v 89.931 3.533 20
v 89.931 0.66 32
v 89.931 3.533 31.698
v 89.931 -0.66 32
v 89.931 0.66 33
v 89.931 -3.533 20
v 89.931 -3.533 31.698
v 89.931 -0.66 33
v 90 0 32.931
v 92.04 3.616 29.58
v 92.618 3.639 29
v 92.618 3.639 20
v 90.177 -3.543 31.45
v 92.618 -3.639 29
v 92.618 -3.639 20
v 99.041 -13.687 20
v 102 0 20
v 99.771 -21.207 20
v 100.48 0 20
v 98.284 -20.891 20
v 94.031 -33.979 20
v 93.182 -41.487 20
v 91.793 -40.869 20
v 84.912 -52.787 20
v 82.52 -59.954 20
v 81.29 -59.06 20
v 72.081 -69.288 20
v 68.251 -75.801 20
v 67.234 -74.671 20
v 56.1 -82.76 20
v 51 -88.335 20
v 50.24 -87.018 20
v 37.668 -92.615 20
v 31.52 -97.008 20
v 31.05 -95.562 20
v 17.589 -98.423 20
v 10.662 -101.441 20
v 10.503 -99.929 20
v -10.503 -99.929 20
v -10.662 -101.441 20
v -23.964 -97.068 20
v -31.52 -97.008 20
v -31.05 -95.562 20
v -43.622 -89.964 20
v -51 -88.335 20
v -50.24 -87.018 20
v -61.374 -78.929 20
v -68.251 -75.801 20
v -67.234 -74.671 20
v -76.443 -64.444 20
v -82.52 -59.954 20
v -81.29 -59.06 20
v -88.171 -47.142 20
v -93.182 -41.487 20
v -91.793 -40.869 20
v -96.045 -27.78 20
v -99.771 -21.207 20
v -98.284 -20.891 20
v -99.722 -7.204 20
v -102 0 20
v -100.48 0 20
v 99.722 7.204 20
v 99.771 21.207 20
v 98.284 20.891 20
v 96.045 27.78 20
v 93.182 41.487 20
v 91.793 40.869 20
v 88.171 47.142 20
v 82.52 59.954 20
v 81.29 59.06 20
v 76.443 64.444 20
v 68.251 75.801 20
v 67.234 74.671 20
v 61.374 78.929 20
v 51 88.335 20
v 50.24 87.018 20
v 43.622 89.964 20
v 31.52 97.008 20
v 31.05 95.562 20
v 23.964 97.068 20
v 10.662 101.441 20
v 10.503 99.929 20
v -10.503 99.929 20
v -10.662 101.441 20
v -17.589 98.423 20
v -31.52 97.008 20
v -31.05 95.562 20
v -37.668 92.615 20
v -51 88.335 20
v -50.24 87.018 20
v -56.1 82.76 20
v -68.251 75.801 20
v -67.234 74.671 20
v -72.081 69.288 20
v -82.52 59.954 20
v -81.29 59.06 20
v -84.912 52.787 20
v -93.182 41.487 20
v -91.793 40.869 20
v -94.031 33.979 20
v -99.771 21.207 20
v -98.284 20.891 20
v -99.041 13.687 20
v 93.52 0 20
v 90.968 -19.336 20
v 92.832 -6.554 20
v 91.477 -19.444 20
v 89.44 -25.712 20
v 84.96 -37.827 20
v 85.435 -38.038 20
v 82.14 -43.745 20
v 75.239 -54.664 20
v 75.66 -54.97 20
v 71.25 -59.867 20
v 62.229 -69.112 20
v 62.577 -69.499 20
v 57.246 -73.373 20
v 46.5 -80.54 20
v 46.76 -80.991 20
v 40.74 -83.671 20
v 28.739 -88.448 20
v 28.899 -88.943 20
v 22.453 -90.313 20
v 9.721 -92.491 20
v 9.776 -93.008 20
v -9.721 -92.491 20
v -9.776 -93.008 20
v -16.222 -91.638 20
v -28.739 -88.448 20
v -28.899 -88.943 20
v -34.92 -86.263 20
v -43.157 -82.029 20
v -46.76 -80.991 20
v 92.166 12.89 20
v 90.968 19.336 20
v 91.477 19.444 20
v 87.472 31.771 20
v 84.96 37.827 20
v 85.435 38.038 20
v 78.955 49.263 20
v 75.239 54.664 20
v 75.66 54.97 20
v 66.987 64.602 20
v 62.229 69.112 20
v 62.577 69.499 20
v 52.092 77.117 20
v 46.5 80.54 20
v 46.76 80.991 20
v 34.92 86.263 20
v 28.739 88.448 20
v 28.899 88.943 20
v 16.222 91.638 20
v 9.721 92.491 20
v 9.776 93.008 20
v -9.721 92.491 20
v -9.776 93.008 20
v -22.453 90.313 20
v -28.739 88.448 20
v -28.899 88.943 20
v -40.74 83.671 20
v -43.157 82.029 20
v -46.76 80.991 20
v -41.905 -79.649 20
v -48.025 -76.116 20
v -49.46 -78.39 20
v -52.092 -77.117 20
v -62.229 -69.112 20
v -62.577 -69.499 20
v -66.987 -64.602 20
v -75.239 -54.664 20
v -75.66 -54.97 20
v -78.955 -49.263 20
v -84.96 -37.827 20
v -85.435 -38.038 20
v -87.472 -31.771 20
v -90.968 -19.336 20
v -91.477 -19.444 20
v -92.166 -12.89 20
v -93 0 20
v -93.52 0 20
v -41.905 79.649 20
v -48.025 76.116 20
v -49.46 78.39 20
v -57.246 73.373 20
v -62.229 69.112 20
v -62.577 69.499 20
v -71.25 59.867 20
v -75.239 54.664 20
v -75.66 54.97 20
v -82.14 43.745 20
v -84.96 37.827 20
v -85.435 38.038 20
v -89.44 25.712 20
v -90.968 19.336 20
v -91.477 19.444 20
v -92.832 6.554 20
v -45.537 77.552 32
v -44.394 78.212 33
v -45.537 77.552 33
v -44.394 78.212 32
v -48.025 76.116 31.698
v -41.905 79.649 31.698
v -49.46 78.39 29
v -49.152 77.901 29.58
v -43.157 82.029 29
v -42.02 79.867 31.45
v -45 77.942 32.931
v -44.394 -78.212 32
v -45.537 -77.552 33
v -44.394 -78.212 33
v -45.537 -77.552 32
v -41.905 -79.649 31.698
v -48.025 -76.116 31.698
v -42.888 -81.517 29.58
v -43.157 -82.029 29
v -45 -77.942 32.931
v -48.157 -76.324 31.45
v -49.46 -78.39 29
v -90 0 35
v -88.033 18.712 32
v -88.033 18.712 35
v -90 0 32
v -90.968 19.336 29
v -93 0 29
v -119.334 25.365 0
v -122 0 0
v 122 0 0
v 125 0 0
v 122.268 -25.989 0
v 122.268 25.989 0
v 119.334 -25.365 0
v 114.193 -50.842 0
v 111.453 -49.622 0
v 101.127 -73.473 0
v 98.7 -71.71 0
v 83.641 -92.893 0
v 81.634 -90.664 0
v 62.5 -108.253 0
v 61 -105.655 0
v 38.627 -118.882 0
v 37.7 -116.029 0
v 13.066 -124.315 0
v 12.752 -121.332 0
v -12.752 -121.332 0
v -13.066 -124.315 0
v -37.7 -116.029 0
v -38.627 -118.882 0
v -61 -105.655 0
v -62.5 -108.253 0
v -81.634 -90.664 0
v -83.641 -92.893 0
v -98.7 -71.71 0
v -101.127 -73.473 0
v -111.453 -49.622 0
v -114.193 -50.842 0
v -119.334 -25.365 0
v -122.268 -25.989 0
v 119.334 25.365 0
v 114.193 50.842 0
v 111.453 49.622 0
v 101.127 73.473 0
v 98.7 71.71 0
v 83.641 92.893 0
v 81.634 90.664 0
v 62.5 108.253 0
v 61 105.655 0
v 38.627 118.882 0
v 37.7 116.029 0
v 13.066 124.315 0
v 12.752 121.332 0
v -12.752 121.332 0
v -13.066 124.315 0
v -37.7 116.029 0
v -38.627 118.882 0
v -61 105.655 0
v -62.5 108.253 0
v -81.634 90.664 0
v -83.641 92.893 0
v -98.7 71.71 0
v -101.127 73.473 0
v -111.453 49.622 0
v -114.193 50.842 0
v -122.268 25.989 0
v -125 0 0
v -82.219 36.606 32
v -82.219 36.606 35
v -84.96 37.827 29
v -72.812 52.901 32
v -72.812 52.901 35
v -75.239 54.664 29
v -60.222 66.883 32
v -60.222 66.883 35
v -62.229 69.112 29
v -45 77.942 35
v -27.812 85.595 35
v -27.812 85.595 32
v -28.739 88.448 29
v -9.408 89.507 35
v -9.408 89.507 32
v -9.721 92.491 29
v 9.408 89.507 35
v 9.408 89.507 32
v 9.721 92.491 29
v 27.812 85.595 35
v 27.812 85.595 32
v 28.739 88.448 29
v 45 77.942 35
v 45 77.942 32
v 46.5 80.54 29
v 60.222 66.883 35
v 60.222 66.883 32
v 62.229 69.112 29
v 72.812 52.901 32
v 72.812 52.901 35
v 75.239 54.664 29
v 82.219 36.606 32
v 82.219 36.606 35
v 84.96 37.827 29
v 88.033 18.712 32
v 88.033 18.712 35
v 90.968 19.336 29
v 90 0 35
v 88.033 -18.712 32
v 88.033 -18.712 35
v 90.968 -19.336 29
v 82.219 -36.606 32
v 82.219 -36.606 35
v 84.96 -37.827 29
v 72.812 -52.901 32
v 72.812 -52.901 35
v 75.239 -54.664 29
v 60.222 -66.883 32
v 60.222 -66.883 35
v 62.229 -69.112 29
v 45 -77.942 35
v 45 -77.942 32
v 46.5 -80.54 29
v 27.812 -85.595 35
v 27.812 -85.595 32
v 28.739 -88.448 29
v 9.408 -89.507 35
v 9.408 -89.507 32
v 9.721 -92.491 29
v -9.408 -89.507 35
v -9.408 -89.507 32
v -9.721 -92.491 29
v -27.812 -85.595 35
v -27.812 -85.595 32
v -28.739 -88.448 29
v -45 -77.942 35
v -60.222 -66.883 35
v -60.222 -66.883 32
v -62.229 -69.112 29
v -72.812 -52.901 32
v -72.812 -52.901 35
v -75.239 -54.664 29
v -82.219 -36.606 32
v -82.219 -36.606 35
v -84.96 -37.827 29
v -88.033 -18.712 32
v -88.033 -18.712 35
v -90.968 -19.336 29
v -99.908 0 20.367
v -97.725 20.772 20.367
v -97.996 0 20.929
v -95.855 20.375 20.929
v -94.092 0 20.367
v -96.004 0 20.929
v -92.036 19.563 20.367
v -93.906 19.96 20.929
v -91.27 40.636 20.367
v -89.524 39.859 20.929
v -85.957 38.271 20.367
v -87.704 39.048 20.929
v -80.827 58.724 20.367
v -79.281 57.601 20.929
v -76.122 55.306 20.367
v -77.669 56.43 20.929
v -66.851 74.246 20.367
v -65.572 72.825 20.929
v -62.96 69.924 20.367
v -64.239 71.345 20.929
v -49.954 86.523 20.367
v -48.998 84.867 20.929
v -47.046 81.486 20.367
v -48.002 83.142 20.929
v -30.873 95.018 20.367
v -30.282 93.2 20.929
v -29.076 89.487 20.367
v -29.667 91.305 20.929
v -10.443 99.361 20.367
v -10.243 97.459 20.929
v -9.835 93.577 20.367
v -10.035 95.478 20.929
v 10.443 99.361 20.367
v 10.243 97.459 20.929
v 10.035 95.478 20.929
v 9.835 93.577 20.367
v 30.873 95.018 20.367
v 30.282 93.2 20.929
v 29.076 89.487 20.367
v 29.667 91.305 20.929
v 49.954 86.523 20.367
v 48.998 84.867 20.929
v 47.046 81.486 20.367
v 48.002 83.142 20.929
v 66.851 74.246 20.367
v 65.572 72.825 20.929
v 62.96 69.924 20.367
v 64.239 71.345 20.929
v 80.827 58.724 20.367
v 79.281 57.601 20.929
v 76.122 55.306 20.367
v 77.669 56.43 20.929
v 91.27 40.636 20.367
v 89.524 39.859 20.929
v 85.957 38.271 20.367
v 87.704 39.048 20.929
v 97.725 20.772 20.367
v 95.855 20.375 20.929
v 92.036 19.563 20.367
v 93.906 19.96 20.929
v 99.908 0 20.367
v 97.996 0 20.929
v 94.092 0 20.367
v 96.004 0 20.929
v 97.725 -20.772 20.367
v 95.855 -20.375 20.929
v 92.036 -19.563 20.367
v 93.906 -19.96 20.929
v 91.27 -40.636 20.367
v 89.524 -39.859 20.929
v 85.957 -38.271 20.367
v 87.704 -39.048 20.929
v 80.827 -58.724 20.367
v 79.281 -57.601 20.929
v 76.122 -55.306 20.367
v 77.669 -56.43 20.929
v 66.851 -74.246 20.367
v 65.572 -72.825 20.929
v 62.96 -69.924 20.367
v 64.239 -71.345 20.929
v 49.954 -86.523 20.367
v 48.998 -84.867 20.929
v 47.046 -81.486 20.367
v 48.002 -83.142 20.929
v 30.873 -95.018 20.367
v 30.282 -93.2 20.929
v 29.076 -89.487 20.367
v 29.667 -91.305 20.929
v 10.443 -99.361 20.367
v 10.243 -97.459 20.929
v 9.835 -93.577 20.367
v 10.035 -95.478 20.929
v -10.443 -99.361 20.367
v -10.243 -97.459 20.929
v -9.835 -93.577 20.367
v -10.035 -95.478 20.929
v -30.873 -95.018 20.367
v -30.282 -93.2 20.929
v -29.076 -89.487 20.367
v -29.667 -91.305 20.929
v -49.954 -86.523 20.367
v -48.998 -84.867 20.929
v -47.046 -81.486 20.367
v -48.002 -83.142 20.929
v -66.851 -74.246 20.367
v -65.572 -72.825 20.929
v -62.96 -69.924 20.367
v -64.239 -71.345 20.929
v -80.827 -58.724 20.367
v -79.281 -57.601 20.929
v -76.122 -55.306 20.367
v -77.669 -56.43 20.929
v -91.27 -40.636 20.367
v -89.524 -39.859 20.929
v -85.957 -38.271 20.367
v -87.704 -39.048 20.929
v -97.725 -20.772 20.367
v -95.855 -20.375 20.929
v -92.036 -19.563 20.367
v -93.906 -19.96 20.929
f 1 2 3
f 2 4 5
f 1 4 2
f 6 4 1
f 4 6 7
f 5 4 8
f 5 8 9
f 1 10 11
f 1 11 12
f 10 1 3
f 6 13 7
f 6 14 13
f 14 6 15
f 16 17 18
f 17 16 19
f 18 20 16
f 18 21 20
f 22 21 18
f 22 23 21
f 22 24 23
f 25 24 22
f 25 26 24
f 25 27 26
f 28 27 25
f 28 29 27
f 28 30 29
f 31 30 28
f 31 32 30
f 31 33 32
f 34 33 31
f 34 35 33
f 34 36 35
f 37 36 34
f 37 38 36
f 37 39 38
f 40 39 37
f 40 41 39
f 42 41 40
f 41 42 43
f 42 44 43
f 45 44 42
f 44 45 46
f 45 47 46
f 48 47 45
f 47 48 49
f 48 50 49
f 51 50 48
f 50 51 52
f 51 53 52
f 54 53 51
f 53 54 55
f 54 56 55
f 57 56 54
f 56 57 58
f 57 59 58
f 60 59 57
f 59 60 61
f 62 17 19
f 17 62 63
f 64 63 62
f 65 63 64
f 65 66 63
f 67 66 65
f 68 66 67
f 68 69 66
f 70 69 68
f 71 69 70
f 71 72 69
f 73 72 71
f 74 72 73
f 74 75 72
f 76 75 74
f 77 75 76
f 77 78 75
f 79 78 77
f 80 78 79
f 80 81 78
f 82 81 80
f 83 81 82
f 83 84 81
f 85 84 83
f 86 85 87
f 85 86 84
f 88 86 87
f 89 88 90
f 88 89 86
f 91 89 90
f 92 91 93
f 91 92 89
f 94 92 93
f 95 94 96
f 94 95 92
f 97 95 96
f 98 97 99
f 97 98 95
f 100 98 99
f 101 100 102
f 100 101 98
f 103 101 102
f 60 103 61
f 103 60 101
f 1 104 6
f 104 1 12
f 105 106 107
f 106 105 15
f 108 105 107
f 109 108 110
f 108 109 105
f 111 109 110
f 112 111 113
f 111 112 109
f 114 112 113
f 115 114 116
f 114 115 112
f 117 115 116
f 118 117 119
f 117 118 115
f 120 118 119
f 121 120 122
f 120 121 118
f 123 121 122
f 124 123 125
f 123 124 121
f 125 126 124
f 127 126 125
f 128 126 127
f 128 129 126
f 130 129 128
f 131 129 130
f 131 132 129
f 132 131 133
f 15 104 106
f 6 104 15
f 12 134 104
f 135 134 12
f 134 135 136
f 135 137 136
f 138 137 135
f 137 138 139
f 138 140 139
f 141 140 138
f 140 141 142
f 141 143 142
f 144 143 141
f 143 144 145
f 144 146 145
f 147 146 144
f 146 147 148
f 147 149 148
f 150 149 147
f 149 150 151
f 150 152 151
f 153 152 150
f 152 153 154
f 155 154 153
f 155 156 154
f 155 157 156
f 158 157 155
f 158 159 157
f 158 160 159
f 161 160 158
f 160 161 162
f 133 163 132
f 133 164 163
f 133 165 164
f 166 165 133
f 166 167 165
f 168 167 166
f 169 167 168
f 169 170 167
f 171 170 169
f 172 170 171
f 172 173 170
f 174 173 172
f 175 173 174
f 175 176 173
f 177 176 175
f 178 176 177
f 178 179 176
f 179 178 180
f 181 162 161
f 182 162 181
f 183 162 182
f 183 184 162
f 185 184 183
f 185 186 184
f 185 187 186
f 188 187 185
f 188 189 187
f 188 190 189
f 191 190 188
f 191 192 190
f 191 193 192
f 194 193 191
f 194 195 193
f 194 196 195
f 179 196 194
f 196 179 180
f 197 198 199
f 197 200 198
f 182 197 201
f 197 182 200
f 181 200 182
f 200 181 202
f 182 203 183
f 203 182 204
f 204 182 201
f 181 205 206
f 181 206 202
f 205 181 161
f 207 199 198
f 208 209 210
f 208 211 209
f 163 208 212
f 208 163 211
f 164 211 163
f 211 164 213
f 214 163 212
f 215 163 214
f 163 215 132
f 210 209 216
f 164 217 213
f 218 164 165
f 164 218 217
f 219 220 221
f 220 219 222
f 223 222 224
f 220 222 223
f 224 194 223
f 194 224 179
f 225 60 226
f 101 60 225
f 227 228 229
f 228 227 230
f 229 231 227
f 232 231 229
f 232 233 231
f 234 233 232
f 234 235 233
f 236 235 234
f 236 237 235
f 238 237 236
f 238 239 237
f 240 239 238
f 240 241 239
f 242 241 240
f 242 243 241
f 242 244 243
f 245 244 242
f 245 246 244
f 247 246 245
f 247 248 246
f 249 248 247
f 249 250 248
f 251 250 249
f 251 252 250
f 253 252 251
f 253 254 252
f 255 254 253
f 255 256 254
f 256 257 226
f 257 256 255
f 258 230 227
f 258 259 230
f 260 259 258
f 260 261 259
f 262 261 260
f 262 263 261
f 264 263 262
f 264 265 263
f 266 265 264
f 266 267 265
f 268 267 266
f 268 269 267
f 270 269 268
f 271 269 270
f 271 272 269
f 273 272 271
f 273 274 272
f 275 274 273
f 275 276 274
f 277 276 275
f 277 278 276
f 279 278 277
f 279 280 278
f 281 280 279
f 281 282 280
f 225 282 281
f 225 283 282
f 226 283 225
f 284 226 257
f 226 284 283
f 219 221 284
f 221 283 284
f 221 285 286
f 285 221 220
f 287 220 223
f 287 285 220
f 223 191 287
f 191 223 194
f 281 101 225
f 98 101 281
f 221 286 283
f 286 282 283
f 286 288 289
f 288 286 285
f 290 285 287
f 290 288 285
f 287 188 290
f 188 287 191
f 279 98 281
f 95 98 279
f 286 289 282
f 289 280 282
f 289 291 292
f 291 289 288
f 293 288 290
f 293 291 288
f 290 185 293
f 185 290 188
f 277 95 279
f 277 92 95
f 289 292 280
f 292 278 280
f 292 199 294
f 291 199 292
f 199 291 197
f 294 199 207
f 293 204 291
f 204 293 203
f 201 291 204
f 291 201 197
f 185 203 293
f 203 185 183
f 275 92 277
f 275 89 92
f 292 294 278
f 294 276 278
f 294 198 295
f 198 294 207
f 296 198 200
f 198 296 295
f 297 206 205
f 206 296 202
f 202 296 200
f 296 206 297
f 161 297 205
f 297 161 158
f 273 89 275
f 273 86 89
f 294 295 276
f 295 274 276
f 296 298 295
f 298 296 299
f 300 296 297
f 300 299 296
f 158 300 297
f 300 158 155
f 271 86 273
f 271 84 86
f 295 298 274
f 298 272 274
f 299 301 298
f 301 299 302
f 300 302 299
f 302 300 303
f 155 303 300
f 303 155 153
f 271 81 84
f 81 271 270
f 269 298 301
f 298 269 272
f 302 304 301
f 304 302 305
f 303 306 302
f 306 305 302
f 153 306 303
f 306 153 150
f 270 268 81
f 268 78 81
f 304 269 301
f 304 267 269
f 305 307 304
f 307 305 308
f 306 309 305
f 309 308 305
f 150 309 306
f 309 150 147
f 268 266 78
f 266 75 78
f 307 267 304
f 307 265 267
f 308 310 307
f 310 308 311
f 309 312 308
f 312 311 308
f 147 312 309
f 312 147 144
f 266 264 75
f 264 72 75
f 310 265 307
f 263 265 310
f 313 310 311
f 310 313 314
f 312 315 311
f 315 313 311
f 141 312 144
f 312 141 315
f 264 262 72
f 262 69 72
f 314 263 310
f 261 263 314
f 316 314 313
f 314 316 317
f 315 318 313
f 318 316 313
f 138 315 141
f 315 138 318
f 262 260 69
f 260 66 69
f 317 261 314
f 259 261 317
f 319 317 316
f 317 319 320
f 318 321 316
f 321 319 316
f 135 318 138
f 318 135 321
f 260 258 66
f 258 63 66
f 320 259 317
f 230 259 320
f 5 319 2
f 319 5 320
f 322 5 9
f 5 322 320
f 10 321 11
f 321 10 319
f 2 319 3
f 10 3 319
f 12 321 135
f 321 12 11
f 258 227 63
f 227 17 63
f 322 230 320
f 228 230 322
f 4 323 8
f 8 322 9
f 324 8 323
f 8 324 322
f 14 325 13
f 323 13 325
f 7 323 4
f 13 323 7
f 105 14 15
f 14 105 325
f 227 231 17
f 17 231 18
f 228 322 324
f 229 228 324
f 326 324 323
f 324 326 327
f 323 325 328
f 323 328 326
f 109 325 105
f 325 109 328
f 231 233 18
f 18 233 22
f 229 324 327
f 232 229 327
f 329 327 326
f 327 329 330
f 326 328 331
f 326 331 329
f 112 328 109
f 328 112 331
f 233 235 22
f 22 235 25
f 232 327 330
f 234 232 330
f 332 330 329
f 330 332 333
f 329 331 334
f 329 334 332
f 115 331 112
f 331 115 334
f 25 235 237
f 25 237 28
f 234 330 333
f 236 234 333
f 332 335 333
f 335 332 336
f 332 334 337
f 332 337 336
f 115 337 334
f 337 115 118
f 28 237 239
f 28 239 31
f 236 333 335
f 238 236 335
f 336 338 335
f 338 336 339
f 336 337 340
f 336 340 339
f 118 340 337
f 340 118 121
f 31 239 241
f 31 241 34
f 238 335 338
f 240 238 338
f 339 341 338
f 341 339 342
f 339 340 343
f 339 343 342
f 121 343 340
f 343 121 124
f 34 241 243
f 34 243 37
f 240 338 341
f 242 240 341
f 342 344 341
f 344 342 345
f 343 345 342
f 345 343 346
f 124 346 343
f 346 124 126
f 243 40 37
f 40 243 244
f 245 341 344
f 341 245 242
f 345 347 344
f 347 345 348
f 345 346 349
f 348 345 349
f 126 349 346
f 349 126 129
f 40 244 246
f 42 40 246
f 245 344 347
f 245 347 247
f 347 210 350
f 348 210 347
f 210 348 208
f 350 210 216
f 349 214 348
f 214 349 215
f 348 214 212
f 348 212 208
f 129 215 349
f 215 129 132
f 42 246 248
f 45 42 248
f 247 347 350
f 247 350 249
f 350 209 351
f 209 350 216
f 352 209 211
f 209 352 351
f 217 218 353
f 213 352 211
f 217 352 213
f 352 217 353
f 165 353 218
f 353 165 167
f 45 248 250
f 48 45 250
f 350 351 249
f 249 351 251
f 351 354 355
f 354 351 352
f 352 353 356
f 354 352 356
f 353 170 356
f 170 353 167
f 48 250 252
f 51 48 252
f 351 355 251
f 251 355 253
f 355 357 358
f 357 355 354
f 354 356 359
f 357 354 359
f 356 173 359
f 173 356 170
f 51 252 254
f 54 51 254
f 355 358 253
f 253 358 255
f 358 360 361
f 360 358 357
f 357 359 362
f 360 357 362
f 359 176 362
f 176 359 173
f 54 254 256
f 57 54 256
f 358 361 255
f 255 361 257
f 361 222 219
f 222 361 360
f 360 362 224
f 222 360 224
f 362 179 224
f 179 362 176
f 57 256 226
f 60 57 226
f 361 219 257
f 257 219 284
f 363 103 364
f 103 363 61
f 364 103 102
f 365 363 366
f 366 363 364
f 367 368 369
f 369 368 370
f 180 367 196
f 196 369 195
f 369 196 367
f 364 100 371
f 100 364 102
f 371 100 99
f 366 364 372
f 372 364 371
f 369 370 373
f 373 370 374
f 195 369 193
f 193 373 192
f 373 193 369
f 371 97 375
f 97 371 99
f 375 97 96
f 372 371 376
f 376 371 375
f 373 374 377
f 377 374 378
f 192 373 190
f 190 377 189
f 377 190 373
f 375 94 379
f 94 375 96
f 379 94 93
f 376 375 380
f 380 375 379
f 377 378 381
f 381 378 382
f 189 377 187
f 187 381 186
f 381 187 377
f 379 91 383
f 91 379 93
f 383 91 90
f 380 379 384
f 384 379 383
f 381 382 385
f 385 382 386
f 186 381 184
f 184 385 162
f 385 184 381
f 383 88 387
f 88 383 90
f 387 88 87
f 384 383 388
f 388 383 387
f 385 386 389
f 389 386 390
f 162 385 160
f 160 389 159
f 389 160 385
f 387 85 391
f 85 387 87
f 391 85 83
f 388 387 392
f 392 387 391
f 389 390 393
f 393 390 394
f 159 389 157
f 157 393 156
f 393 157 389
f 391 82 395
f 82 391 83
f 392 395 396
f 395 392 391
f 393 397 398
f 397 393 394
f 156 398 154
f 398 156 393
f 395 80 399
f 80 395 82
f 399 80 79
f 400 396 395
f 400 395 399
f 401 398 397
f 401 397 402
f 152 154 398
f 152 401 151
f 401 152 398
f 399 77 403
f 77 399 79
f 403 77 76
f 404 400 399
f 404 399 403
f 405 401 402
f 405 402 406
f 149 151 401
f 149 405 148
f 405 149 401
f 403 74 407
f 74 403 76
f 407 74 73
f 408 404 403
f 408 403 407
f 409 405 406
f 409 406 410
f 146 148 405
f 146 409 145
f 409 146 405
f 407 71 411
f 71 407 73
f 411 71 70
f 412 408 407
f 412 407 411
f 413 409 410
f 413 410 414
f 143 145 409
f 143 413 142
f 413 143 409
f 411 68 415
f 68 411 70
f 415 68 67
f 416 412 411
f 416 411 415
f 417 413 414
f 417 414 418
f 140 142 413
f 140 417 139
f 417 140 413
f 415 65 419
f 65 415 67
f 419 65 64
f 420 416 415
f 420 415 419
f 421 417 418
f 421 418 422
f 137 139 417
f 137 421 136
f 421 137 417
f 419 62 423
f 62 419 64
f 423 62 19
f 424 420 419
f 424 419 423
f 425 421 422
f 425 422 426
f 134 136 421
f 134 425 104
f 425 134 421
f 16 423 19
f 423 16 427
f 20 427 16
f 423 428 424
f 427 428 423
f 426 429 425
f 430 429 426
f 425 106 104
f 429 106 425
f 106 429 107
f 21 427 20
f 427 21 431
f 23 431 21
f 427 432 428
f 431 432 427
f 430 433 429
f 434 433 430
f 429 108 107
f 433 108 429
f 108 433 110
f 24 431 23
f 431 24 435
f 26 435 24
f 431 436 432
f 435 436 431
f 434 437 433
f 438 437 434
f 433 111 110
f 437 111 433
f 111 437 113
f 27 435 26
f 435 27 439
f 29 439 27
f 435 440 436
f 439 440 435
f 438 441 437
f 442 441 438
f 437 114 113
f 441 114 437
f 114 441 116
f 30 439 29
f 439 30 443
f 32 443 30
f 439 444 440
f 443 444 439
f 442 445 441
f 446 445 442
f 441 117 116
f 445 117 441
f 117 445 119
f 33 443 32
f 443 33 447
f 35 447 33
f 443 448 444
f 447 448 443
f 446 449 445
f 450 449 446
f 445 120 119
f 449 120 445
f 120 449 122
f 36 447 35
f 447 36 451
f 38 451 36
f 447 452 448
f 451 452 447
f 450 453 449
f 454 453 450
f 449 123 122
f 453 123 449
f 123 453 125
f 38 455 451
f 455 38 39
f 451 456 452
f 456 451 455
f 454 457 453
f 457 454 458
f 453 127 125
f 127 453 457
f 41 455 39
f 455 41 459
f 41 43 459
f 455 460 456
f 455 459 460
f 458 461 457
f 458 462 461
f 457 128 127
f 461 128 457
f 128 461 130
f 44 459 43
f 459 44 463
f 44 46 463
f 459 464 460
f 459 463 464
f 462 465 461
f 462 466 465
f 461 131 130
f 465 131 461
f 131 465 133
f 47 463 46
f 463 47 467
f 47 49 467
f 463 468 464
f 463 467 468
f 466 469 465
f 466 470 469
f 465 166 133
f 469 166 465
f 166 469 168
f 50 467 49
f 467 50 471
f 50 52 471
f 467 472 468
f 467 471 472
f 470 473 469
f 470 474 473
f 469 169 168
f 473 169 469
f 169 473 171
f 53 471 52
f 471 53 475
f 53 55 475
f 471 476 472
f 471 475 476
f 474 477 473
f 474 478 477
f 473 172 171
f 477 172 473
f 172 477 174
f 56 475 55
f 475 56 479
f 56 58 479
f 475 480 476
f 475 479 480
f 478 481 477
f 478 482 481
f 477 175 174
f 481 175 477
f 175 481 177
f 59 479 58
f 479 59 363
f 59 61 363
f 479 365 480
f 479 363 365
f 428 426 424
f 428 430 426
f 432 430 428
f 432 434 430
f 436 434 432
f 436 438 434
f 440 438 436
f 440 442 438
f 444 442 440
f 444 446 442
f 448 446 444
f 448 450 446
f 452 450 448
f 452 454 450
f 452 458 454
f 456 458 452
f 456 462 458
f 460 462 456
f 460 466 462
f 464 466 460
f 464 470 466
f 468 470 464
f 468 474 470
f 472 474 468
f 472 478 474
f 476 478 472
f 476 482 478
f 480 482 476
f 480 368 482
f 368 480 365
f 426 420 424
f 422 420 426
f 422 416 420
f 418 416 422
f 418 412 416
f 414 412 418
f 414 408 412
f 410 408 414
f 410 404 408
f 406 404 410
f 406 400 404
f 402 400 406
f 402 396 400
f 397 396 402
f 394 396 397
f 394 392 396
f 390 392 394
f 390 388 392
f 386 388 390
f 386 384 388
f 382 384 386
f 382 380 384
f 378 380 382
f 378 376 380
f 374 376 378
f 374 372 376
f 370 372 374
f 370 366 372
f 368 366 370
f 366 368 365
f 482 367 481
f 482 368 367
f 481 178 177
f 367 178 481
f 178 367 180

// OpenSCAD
jogwheel_outer_rad = 125;
jogwheel_inner_rad = 90;
jogwheel_height = 35;
thickness = 3;

// vertical datum is at bottom of this part
// centred on z-axis

module jogwheel_outer(outer_params){
    
    outer_rad = outer_params[0];
    outer_inside_rad = outer_params[1];
    jogwheel_height = outer_params[2];
    thickness = outer_params[3];
    bearing_params = outer_params[4];
    tooth_params = outer_params[5];
    bearing_grooves = outer_params[6];
    clearances = outer_params[7];

    outer_bear_rad_offset = bearing_params[0];
    outer_bear_vert_offset = bearing_params[1];
    bearing_dims = bearing_params[4];
    bearing_OD = bearing_dims[1];

    tooth_depth = tooth_params[0];
    tooth_height = tooth_params[1];
    tooth_width = tooth_params[2];

    bearing_groove_dim = bearing_grooves[0];
    bearing_groove_depth = bearing_grooves[1];
    outer_bearing_groove_rad = bearing_grooves[3];

    clearance = clearances[0];

    // not used, here for ref for asm:
    // bearing_centre = jogwheel_inner_rad + 7.5; 
    bearing_rest_height = bearing_OD/2 + 8.5;
    mating_slot_width = tooth_width - 2*clearance; // this is an angle
    mating_slot_clearance = 1; // just used to give overlap for the union of slots

    //color("black")
    difference() {
        union() {
            
            // main shape, swept polygon
            // dimensions worked out for a 45 degree angle
            rotate_extrude()
            polygon( points=[[outer_inside_rad, jogwheel_height],
                [outer_rad, 0],
                [outer_rad-thickness, 0],
                [outer_rad - thickness - bearing_rest_height, bearing_rest_height],
                [outer_inside_rad + thickness, bearing_rest_height],
                [outer_inside_rad + thickness, jogwheel_height - 2*thickness],
                [outer_inside_rad, jogwheel_height - thickness]] );

            // mating slots to match jogwheel_inner
            mating_slot_start = outer_inside_rad + thickness + mating_slot_clearance;

            for ( i = [0 : 2] ) {
                rotate([0,0,i*120 - mating_slot_width/2])
                rotate_extrude(angle=mating_slot_width)
                polygon( points=[[outer_inside_rad, jogwheel_height - thickness + mating_slot_clearance],
                    [mating_slot_start, jogwheel_height - 2*thickness],
                    [mating_slot_start, bearing_rest_height],
                    [outer_inside_rad, bearing_rest_height]] );
            }
            
        }

        rotate_extrude()
            translate([outer_bearing_groove_rad, bearing_rest_height+bearing_groove_depth-bearing_groove_dim/2, 0])
            circle(d=bearing_groove_dim);
}

}
difference() {

// outer_params = [outer_rad, inside_rad, jogwheel_height, thickness, bearing_params, tooth_params, clearances];
outer_params = [125, 90, 35, 3, [91, 14.5, 1, 1, [5,23,7], 21], [3,8,6.5], [14, 1, 60, 97], [1,5]];
jogwheel_outer(outer_params);

// optional section
// translate([-150,-300,-75])  
// cube(300);

}
